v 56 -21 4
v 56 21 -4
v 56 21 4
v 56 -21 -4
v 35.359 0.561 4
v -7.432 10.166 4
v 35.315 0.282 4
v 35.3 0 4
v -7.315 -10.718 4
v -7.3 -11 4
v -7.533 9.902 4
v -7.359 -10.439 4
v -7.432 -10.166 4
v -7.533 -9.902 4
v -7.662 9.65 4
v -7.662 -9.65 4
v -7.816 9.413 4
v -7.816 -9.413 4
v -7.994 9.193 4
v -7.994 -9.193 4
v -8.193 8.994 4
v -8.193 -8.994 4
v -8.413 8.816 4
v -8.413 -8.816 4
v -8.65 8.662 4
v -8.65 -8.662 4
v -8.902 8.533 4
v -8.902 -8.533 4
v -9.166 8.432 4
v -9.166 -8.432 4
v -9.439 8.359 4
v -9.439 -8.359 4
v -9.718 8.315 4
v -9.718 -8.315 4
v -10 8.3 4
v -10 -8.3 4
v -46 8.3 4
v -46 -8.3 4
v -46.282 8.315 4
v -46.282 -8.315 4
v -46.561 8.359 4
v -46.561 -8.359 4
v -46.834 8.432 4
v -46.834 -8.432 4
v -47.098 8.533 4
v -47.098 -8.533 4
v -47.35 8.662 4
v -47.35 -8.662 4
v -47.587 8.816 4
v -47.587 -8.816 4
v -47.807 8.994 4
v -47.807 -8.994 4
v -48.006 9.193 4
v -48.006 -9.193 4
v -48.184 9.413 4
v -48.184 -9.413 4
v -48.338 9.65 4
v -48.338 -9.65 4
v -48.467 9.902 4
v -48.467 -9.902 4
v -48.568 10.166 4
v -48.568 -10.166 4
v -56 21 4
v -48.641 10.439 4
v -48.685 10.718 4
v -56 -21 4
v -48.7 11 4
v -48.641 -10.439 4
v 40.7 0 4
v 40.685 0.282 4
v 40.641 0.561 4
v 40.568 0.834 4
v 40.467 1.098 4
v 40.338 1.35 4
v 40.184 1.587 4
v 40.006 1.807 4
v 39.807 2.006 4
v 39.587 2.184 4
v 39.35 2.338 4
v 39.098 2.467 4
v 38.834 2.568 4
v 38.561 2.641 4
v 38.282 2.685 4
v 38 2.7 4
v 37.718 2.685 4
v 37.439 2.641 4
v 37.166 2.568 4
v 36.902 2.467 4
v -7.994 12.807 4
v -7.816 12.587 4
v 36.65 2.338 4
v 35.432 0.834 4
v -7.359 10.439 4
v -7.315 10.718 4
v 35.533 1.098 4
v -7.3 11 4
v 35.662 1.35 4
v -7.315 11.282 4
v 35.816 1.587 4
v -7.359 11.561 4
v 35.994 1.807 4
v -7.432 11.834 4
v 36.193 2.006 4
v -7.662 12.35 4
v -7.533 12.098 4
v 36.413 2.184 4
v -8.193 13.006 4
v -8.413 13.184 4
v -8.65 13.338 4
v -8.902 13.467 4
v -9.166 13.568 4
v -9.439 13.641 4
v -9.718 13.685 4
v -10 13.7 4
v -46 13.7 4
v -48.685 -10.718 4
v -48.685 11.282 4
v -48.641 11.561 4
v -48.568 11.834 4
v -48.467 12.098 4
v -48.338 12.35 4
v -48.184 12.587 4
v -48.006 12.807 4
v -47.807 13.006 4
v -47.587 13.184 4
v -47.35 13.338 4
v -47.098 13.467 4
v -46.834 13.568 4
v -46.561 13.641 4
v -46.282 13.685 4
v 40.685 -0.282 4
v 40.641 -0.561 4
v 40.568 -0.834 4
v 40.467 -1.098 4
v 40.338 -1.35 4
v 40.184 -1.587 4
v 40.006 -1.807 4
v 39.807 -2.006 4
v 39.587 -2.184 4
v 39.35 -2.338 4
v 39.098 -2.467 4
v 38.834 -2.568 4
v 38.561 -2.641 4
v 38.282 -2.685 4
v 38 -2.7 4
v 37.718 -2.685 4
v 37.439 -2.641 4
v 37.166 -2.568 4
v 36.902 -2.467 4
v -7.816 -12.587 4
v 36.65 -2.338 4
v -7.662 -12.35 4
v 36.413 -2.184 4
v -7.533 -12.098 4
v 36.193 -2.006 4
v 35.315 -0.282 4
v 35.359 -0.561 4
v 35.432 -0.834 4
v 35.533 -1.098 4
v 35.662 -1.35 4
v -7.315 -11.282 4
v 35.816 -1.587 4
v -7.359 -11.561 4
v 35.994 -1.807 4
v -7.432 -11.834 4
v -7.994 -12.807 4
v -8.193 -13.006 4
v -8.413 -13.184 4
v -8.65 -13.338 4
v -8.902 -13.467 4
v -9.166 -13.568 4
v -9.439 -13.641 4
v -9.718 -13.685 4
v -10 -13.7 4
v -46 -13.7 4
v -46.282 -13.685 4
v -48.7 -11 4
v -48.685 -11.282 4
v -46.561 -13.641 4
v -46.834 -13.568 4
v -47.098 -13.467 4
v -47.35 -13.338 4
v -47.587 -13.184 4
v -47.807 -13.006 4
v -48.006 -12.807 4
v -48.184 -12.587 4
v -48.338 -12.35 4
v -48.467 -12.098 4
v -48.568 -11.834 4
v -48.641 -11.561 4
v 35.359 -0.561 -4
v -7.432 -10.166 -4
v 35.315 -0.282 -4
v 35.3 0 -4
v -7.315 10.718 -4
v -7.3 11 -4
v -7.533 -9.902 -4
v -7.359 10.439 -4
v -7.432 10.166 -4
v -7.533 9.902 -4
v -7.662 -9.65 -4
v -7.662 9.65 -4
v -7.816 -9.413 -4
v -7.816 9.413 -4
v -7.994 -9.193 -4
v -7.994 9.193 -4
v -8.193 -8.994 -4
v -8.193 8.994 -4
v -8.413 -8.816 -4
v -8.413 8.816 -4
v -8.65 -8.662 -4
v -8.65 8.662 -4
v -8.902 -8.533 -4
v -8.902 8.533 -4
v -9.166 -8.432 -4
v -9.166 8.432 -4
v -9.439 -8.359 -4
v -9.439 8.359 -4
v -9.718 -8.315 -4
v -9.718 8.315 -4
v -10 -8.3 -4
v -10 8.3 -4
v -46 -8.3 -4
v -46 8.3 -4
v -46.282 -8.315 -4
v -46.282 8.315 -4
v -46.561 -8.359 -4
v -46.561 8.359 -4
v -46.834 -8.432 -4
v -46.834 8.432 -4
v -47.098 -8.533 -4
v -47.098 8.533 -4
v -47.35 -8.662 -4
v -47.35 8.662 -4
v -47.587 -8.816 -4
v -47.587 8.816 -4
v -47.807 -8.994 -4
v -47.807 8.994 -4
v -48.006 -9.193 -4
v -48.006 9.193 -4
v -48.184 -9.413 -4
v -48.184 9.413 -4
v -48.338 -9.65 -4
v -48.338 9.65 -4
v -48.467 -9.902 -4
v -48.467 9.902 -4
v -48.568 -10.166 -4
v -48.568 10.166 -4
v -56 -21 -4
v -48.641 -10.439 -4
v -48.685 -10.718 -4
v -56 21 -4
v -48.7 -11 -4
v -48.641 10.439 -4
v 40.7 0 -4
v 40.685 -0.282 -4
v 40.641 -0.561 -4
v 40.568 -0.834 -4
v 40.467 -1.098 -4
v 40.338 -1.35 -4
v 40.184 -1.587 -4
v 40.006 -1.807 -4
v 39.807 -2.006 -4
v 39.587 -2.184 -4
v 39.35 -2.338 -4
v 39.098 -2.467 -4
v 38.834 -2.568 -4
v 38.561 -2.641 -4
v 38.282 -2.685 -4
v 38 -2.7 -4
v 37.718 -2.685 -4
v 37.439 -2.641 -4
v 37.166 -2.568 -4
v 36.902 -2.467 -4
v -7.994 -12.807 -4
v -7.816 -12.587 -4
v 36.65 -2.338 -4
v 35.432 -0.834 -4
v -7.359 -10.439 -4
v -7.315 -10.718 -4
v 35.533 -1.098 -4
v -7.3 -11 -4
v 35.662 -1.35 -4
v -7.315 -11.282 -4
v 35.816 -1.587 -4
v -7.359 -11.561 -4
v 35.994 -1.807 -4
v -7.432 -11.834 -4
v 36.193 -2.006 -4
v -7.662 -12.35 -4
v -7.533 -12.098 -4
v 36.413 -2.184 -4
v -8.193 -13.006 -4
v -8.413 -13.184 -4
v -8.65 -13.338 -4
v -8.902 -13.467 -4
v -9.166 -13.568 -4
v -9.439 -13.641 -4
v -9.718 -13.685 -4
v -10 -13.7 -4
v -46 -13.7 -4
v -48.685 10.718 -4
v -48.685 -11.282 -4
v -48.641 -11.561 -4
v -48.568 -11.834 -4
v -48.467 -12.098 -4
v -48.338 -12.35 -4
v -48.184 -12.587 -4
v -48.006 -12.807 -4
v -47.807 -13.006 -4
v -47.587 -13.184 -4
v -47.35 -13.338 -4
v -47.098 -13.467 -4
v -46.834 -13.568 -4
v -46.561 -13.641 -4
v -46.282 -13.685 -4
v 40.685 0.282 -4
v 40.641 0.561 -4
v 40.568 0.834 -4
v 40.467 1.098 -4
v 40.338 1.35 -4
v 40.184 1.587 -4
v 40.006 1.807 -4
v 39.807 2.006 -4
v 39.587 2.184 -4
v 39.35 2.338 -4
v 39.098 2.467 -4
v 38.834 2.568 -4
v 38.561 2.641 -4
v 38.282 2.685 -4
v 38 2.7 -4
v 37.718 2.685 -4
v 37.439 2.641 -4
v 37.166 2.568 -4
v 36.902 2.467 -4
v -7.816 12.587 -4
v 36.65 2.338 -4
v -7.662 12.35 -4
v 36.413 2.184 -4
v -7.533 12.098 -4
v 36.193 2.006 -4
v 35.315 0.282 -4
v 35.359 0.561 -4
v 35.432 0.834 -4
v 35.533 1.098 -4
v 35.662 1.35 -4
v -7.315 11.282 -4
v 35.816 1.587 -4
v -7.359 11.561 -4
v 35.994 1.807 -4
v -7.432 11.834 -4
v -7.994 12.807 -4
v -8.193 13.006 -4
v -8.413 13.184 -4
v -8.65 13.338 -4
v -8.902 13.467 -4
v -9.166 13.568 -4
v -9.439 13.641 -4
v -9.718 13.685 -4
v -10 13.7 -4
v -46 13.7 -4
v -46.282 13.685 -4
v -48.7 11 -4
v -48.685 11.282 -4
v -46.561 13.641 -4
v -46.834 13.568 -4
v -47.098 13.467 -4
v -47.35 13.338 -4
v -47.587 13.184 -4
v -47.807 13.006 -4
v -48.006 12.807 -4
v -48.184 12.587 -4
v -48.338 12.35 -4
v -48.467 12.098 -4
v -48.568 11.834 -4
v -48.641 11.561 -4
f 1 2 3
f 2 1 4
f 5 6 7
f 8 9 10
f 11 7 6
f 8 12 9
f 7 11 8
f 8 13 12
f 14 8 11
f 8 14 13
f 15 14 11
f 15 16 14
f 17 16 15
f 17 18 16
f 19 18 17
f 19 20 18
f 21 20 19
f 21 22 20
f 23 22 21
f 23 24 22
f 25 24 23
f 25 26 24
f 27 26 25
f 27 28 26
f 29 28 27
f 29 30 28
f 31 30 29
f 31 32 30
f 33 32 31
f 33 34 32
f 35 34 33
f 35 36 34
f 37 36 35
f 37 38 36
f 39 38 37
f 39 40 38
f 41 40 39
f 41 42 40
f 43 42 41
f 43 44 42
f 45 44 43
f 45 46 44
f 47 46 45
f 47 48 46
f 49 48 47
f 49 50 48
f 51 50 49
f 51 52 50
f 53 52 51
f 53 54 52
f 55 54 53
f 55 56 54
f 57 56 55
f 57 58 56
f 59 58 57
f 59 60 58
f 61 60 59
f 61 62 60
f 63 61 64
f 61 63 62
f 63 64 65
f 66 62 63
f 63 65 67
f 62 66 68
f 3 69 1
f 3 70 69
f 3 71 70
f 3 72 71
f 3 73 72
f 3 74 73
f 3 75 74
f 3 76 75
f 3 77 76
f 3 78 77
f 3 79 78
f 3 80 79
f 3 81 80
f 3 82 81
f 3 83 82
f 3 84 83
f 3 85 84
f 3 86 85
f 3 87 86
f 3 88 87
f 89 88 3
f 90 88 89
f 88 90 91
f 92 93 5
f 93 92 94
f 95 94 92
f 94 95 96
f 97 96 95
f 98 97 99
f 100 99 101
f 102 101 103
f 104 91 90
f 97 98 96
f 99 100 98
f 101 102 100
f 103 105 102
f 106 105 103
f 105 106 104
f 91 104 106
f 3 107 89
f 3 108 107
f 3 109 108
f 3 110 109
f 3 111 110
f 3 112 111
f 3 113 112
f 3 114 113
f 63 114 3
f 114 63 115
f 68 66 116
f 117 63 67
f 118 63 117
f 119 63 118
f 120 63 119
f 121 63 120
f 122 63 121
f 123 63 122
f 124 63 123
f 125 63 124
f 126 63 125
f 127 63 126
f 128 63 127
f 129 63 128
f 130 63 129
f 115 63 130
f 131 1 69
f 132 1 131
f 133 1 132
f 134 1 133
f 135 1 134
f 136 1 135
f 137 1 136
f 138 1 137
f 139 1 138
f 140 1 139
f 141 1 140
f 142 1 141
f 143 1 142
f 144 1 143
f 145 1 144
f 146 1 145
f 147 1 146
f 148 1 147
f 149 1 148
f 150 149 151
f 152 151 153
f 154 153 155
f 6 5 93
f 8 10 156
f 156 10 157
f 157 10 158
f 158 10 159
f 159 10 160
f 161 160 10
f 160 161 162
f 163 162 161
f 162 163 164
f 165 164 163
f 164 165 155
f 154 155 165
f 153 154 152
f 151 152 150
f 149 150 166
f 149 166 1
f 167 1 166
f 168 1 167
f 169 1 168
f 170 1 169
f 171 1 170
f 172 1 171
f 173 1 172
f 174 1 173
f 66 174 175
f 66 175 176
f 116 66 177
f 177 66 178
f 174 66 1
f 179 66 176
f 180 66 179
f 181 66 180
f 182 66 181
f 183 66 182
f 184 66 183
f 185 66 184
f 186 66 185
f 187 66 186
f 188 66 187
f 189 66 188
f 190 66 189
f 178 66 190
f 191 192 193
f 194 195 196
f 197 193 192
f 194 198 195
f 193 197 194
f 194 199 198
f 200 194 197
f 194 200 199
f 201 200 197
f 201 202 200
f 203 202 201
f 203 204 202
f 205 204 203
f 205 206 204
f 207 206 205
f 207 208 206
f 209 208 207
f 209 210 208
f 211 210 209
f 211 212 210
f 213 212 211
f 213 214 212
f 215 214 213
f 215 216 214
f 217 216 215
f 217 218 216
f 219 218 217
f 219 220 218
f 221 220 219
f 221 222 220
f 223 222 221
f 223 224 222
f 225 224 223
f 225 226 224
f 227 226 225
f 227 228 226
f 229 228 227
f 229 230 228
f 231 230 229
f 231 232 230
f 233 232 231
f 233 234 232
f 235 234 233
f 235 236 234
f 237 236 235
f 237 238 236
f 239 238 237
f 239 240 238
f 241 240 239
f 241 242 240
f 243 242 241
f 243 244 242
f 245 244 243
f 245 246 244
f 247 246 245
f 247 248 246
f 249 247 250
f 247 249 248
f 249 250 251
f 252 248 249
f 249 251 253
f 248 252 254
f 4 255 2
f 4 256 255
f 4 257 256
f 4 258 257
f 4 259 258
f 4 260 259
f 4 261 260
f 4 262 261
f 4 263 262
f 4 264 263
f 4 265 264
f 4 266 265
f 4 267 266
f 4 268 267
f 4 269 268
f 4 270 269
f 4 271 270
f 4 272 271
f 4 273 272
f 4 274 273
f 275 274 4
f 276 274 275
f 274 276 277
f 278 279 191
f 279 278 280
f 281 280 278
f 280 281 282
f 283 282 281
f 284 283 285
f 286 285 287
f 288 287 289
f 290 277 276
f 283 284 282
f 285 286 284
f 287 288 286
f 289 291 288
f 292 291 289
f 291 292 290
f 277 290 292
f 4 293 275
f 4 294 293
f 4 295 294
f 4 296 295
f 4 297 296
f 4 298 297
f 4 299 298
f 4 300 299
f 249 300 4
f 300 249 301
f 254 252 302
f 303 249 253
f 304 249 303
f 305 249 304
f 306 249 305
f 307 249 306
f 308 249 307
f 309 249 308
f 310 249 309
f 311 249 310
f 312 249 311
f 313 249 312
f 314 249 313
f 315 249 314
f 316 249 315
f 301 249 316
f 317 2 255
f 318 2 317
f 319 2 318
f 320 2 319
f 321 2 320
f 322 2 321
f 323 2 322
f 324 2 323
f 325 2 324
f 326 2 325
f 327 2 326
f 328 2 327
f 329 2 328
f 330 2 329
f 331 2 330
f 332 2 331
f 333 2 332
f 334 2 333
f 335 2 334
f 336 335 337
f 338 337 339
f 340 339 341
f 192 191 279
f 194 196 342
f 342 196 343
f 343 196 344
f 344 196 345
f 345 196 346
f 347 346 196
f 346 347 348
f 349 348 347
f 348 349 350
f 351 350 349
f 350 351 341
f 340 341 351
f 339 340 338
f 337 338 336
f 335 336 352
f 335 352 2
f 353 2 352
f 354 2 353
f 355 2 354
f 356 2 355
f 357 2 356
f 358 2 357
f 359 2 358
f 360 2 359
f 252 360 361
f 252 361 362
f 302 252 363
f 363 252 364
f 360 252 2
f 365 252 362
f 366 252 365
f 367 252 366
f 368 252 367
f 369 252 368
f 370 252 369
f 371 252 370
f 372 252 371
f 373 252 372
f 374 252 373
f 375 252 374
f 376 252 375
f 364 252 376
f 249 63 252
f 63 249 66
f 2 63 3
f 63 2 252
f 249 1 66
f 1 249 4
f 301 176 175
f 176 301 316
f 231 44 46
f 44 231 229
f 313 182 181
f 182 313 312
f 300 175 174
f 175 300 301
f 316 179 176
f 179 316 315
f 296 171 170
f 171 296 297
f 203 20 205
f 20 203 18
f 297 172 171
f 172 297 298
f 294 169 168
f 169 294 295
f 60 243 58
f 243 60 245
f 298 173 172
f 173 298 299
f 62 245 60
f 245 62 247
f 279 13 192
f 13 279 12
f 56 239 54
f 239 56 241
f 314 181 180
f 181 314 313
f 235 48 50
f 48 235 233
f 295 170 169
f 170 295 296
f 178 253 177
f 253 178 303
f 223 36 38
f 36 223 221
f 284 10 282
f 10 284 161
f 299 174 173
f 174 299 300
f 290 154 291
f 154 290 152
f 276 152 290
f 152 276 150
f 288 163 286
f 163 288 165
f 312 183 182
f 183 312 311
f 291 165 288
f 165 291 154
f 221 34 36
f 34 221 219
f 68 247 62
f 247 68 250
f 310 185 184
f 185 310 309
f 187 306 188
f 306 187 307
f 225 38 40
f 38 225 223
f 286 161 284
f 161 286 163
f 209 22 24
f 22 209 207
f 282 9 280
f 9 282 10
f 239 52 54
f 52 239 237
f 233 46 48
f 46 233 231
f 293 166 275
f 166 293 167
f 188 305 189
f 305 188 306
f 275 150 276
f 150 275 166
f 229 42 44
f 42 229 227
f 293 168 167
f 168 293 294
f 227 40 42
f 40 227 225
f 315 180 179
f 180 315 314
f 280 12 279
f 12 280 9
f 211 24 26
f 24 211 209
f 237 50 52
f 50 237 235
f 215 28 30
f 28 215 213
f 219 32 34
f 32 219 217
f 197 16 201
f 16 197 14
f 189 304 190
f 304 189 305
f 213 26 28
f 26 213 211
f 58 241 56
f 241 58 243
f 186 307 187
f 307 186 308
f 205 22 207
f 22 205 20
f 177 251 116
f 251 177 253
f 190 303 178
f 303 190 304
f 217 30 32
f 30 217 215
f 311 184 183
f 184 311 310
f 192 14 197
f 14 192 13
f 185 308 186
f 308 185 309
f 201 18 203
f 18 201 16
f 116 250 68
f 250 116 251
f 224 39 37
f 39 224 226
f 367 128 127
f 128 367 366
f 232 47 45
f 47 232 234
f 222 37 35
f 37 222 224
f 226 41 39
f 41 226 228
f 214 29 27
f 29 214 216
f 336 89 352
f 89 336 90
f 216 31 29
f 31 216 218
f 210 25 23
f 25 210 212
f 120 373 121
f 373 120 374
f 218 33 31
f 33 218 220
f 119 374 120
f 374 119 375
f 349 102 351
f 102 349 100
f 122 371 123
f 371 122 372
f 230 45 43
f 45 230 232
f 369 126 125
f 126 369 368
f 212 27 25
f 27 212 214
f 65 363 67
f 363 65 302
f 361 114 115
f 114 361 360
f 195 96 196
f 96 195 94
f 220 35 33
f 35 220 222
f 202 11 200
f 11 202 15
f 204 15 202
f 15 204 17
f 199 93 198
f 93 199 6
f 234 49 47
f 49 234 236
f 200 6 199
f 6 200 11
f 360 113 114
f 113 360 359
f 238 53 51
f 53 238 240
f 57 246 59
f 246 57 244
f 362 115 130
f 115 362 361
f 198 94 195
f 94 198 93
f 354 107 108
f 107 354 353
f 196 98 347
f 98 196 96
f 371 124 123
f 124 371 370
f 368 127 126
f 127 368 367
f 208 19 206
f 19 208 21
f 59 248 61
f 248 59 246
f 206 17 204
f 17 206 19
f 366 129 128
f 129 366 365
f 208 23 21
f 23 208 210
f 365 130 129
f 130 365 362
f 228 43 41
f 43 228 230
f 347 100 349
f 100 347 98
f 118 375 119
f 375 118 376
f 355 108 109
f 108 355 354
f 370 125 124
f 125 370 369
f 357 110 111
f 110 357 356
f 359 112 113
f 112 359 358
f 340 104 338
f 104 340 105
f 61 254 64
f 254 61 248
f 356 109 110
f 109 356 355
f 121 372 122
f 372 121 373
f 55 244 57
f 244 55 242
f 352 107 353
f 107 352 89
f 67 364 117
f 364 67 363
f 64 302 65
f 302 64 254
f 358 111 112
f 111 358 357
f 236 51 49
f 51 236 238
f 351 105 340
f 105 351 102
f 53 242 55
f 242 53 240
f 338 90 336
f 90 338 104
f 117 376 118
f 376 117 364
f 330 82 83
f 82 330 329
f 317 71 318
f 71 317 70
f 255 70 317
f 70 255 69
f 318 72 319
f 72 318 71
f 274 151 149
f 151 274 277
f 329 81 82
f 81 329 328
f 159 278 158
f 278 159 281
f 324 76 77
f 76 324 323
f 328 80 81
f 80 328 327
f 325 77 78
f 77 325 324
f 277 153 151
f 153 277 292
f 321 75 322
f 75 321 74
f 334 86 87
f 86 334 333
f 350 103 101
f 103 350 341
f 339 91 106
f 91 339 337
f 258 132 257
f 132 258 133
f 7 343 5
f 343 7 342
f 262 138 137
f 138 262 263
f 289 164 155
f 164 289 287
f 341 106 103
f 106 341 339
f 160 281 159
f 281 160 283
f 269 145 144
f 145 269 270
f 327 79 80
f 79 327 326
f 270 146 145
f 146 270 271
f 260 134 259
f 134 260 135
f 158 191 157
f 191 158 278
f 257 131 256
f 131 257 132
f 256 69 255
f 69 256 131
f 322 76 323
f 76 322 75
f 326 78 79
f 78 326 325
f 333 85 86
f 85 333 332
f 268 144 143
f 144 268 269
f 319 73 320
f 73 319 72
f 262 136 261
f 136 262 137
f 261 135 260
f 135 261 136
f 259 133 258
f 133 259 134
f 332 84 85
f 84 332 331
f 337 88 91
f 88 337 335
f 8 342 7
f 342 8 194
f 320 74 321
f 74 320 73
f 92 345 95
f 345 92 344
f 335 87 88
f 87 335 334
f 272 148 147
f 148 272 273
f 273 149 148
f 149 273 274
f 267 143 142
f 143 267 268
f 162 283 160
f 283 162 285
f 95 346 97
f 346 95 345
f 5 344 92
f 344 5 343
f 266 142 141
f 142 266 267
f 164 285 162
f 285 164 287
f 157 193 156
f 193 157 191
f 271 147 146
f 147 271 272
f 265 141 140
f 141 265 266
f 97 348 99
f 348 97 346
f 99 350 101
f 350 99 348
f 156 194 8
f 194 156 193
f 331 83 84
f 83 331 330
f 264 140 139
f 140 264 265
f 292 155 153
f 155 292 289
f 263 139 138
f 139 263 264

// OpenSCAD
// GT2 idler tensioner slide for 15 mm belt.
$fn = 60;
eps = 0.02;
slide_l = 112;
slide_w = 42;
slide_t = 8;
belt_w = 15;
slot_l = 36;
axle_d = 5.4;
axle_x = slide_l / 2 - 18;
module slot(y) {
    hull() {
        translate([-slide_l / 4 - slot_l / 2, y, -slide_t / 2 - eps]) cylinder(d = 5.4, h = slide_t + 2 * eps);
        translate([-slide_l / 4 + slot_l / 2, y, -slide_t / 2 - eps]) cylinder(d = 5.4, h = slide_t + 2 * eps);
    }
}
difference() {
    cube([slide_l, slide_w, slide_t], center = true);
    slot(-11);
    slot(11);
    translate([axle_x, 0, -slide_t / 2 - eps]) cylinder(d = axle_d, h = slide_t + 2 * eps);
}
